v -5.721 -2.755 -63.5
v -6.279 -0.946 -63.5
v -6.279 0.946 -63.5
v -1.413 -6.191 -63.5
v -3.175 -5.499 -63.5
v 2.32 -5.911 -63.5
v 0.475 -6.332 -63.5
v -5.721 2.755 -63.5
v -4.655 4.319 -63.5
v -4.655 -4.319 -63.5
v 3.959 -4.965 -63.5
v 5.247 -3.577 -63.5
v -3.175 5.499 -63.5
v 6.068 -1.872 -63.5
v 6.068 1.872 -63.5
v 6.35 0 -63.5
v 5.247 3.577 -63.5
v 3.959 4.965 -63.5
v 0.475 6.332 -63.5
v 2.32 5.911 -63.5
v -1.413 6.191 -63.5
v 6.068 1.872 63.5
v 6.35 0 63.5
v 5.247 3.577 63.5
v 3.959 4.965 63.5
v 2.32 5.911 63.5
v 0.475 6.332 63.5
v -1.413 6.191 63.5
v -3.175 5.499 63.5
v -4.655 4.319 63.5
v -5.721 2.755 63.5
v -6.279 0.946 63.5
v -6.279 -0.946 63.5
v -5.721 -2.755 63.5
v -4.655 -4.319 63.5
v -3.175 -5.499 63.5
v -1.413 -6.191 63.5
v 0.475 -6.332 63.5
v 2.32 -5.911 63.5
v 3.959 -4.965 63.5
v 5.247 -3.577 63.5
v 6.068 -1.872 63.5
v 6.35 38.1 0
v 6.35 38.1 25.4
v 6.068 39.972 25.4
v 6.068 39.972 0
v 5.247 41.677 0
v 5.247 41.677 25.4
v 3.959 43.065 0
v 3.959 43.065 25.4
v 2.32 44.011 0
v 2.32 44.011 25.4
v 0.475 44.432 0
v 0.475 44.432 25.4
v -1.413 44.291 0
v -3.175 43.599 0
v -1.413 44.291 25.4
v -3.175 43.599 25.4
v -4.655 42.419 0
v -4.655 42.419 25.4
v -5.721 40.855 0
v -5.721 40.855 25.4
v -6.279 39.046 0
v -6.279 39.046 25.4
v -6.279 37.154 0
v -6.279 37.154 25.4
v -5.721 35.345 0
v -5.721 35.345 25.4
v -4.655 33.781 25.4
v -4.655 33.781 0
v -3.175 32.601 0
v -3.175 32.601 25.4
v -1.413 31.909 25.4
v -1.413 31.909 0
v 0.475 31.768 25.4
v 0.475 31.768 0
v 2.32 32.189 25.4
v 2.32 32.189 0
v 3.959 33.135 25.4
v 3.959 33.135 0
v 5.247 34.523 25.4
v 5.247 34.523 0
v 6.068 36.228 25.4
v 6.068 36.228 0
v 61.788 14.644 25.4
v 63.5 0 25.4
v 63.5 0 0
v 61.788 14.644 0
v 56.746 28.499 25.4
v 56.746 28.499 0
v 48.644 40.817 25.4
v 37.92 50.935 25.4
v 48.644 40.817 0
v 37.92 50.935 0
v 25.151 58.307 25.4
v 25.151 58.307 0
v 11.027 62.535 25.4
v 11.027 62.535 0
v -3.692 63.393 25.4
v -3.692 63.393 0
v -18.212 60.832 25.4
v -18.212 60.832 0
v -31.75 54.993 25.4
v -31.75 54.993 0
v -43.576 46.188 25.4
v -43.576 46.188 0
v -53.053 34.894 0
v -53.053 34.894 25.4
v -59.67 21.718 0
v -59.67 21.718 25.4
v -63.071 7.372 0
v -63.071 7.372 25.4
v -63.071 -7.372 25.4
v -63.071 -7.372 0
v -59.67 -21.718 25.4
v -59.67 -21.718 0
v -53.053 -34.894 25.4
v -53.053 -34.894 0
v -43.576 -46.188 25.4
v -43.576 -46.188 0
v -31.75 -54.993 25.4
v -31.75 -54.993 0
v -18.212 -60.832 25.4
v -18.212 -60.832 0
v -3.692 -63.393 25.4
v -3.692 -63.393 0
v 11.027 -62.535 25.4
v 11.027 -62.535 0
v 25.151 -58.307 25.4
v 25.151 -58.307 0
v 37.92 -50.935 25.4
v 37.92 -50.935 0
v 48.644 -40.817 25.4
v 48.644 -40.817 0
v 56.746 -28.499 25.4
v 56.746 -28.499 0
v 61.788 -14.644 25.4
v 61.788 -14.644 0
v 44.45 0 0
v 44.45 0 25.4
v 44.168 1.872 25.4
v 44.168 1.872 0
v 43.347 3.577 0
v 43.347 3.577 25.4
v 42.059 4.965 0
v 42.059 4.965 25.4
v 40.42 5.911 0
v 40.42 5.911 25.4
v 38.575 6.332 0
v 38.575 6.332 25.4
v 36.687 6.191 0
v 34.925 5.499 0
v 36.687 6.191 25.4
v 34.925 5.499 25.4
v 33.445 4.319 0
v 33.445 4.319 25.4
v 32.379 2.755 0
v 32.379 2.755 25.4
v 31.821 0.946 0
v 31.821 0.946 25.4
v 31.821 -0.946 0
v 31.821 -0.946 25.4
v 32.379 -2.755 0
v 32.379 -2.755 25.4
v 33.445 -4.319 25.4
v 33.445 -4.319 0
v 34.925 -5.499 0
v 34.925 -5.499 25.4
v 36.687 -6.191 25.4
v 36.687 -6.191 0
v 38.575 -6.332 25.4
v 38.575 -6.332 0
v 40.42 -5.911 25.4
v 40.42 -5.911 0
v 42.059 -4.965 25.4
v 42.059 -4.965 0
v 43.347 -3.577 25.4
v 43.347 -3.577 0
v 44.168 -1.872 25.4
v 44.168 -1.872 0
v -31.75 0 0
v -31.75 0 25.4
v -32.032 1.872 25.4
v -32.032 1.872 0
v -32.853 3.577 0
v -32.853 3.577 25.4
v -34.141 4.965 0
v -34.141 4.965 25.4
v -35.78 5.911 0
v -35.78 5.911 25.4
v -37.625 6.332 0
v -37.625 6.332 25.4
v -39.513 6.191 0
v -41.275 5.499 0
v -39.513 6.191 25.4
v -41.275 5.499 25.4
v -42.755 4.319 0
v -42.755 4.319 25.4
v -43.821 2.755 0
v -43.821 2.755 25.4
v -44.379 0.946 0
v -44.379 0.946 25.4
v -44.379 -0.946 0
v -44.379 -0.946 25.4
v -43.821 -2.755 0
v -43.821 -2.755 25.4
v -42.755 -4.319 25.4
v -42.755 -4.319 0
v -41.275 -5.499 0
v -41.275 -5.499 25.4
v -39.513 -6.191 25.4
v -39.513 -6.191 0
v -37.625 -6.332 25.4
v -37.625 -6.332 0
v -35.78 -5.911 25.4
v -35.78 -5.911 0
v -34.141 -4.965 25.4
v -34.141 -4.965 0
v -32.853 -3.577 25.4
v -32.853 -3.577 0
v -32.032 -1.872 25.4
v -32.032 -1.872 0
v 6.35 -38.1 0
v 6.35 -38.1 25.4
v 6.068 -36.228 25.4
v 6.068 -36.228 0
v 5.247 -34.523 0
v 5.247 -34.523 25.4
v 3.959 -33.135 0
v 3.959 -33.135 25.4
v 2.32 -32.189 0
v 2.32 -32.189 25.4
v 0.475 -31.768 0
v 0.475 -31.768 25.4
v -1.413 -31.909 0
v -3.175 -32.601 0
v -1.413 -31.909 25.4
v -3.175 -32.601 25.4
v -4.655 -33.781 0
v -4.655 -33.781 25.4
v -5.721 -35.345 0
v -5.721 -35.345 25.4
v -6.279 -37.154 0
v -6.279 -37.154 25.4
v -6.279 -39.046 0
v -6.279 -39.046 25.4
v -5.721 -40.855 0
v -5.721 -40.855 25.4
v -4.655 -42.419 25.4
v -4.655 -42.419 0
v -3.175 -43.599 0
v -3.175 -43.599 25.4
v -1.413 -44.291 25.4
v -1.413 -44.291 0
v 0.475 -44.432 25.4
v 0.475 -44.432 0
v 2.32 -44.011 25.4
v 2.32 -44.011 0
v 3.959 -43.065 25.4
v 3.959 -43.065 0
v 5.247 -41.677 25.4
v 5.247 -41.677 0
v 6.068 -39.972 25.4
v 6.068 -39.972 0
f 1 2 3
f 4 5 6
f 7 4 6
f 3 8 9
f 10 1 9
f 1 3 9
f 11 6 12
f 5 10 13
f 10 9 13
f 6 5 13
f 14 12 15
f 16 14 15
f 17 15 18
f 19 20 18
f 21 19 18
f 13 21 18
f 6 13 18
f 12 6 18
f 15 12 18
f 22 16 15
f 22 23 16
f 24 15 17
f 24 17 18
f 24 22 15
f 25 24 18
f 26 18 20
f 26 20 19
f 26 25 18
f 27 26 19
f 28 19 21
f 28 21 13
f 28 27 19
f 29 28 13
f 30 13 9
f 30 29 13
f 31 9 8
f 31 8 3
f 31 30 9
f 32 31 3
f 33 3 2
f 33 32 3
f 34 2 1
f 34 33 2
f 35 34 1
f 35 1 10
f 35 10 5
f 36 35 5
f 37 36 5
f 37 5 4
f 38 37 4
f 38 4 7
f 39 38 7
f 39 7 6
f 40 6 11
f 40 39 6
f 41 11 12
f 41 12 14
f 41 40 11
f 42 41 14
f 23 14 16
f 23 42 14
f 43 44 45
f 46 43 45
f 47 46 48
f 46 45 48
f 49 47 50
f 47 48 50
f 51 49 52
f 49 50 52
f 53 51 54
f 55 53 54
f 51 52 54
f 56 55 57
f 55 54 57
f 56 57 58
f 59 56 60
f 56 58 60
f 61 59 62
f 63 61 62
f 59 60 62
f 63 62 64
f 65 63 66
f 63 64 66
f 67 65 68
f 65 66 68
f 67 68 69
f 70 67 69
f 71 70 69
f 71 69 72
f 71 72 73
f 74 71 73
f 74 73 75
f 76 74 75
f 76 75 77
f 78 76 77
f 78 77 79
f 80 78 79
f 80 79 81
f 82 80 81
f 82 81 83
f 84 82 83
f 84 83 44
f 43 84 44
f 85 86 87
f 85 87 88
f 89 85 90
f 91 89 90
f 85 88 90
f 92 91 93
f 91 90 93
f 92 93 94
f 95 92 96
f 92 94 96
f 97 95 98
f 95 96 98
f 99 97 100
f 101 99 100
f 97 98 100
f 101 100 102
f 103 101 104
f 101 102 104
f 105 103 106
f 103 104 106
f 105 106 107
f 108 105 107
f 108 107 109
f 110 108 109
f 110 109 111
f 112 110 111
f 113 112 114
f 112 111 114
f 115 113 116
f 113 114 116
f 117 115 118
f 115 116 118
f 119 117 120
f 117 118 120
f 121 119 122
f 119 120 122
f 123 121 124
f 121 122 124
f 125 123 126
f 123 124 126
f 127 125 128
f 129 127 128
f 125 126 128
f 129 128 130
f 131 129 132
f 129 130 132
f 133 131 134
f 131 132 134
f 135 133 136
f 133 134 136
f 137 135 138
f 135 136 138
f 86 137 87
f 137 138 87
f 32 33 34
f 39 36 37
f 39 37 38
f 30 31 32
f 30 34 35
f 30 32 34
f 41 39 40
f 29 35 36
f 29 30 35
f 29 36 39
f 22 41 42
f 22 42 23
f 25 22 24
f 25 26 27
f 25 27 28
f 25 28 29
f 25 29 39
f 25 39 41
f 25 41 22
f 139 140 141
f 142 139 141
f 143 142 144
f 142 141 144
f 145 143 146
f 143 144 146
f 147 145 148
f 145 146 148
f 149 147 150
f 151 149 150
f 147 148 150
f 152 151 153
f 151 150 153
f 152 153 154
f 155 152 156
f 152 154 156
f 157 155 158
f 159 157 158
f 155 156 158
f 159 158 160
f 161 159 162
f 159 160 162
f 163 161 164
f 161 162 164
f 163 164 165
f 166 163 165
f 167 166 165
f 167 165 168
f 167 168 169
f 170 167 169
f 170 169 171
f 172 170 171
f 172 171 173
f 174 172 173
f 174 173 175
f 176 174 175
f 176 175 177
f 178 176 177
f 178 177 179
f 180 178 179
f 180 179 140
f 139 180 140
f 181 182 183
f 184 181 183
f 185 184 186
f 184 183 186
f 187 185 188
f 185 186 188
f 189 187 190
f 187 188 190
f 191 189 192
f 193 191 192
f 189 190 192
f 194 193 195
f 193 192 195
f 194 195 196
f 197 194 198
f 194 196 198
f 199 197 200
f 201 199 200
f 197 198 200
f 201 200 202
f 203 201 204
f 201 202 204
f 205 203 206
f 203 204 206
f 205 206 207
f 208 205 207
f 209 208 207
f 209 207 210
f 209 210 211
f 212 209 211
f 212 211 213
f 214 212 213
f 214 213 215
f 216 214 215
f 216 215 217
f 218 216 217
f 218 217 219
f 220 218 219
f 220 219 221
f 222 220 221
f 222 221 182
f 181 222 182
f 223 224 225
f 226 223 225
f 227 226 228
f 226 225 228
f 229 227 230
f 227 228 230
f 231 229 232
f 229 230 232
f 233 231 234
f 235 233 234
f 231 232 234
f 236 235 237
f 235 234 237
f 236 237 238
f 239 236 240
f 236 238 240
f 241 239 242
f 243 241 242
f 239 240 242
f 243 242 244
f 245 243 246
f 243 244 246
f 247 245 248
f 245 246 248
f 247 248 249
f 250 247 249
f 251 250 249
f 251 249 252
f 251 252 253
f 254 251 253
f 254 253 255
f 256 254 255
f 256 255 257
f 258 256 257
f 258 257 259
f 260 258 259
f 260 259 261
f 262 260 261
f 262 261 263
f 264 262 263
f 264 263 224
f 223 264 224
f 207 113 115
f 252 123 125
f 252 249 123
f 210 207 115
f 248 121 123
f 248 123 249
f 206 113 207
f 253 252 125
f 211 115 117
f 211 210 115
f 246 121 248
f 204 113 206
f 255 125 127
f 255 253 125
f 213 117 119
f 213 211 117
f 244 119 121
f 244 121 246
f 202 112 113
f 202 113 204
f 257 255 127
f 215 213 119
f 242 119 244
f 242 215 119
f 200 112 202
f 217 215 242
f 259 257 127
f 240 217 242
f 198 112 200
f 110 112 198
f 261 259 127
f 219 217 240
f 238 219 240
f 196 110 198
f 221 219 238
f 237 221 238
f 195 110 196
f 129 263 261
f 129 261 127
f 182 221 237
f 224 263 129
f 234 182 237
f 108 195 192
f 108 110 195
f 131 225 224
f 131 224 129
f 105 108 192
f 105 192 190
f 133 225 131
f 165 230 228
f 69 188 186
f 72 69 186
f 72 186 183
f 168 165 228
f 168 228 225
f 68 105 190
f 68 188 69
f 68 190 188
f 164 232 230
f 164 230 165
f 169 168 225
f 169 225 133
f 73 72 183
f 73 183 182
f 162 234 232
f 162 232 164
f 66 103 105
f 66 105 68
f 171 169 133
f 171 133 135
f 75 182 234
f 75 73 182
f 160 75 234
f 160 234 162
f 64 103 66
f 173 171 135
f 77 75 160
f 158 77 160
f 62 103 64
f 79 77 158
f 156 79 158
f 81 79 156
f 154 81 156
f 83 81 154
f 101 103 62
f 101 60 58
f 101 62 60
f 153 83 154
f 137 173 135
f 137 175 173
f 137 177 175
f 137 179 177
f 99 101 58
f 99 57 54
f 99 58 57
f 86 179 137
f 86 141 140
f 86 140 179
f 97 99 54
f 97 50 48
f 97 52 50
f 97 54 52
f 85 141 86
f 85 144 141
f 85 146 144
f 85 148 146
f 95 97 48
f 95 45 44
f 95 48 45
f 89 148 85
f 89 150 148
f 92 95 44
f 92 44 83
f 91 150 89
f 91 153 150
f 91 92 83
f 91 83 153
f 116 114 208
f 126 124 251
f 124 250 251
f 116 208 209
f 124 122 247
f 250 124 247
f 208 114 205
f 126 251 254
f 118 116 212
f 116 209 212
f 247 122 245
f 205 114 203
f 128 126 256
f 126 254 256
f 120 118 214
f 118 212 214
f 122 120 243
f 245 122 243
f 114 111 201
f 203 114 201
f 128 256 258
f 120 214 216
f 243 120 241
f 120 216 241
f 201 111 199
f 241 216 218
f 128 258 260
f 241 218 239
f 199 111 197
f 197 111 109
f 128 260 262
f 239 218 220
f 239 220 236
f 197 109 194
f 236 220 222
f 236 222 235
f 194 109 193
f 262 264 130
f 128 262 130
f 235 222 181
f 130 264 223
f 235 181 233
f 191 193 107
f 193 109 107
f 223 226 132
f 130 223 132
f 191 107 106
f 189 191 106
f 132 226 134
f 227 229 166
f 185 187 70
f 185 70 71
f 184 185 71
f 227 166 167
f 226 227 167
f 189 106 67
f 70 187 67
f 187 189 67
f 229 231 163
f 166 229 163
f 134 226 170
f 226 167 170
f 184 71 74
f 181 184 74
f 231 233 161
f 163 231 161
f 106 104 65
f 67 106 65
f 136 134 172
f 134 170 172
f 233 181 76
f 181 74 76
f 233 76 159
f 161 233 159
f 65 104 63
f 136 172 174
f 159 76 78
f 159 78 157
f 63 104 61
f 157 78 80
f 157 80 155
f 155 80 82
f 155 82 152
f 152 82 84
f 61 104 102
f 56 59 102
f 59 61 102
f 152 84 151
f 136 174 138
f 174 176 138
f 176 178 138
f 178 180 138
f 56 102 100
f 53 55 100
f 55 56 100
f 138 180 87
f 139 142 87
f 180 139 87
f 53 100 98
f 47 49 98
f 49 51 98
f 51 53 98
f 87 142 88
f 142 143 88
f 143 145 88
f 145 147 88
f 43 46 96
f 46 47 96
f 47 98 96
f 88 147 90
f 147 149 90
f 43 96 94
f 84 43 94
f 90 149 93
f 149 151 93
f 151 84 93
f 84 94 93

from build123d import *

# Parameters (mm, degrees)
F0_R     = 63.5
F1_DEPTH = 25.4
F2_R     = 6.35
F3_DEPTH = 25.401
F4_R     = 6.35
F5_DEPTH = 63.5


with BuildPart() as f1:
    # F0 (on Top) → F1 (new body)
    with BuildSketch(Plane.XY):
        Circle(F0_R)
    extrude(amount=F1_DEPTH)

    # F2 (on face) → F3 (cut, through all)
    with BuildSketch(Plane.XY.offset(25.4)):
        with Locations((-38.1, 0)):
            Circle(F2_R)
        with Locations((0, -38.1)):
            Circle(F2_R)
        with Locations((38.1, 0)):
            Circle(F2_R)
        with Locations((0, 38.1)):
            Circle(F2_R)
    extrude(amount=-F3_DEPTH, mode=Mode.SUBTRACT)


with BuildPart() as f5:
    # F4 (on Top) → F5 (new body, symmetric)
    with BuildSketch(Plane.XY):
        Circle(F4_R)
    extrude(amount=F5_DEPTH, both=True)


solid = Compound([f1.part, f5.part])
